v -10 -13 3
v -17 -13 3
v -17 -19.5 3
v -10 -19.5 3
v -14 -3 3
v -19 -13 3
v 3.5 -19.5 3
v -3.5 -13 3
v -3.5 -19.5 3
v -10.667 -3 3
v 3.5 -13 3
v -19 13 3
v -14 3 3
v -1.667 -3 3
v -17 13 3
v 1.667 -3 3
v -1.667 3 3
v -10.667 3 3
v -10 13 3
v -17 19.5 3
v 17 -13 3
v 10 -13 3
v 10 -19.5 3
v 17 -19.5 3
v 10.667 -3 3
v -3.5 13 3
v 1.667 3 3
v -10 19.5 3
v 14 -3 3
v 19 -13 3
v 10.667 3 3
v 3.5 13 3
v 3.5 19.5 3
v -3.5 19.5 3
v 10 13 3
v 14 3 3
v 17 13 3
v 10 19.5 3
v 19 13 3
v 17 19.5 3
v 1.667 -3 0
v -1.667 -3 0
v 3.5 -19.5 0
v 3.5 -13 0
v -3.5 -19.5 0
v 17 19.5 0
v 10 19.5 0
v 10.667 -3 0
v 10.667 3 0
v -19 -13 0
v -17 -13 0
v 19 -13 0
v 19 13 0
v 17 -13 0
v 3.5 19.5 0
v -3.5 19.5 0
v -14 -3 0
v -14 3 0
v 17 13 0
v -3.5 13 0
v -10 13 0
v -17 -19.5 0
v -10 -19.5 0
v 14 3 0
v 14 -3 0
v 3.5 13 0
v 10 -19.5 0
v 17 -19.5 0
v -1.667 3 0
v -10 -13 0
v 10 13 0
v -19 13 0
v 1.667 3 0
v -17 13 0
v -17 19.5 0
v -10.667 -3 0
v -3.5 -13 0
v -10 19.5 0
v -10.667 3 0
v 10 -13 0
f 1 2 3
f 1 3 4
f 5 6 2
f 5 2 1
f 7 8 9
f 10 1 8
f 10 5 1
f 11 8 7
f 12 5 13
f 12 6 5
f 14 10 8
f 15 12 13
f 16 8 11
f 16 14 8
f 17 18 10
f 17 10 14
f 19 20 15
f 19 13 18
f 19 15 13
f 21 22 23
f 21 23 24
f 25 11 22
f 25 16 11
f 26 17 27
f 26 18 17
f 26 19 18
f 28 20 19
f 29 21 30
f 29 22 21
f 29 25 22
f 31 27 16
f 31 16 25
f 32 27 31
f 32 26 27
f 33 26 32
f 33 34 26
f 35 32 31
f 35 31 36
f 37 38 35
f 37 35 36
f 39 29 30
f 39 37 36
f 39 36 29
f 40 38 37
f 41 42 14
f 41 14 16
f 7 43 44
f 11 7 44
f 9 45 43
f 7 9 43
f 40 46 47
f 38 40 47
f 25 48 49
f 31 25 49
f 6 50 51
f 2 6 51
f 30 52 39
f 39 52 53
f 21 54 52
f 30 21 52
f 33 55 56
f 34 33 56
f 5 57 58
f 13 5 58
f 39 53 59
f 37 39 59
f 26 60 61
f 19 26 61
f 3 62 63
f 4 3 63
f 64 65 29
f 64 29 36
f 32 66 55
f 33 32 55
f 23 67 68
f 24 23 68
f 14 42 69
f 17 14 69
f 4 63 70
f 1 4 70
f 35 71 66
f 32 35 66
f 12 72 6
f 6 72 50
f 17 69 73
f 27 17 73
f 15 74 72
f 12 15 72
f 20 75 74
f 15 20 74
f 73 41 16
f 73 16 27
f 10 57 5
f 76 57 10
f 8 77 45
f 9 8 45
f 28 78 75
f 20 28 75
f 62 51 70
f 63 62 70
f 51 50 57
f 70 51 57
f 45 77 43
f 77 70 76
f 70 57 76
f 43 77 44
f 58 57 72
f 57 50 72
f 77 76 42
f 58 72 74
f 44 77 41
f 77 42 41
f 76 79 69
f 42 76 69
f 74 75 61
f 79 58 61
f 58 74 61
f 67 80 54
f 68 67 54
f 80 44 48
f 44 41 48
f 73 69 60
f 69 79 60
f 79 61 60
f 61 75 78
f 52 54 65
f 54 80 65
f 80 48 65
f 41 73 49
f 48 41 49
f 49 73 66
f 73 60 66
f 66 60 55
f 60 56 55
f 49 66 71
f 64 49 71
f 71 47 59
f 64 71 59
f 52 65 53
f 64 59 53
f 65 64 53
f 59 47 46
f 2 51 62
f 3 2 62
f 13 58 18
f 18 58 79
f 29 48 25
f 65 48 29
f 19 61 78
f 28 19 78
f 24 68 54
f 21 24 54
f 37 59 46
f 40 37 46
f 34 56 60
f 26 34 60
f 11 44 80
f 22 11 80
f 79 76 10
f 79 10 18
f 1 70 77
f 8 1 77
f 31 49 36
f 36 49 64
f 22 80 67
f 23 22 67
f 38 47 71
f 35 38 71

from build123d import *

# Parameters (mm, degrees)
SKETCH_1_W      = 3.333333333
SKETCH_1_H      = 6
SKETCH_1_W_2    = 3.333333334
EXTRUDE_1_DEPTH = 3


with BuildPart() as part:
    # 草图1 → 凸台-拉伸1 (new body)
    with BuildSketch(Plane.XY):
        Polygon((-17, 19.5), (-17, 13), (-19, 13), (-19, -13), (-17, -13), (-17, -19.5), (-10, -19.5), (-10, -13), (-3.5, -13), (-3.5, -19.5), (3.5, -19.5), (3.5, -13), (10, -13), (10, -19.5), (17, -19.5), (17, -13), (19, -13), (19, 13), (17, 13), (17, 19.5), (10, 19.5), (10, 13), (3.5, 13), (3.5, 19.5), (-3.5, 19.5), (-3.5, 13), (-10, 13), (-10, 19.5), align=None)
        with Locations((12.333333334, 0)):
            Rectangle(SKETCH_1_W, SKETCH_1_H, mode=Mode.SUBTRACT)
        with Locations((-12.333333334, 0)):
            Rectangle(SKETCH_1_W, SKETCH_1_H, mode=Mode.SUBTRACT)
        Rectangle(SKETCH_1_W_2, SKETCH_1_H, mode=Mode.SUBTRACT)
    extrude(amount=EXTRUDE_1_DEPTH)


solid = part.part
